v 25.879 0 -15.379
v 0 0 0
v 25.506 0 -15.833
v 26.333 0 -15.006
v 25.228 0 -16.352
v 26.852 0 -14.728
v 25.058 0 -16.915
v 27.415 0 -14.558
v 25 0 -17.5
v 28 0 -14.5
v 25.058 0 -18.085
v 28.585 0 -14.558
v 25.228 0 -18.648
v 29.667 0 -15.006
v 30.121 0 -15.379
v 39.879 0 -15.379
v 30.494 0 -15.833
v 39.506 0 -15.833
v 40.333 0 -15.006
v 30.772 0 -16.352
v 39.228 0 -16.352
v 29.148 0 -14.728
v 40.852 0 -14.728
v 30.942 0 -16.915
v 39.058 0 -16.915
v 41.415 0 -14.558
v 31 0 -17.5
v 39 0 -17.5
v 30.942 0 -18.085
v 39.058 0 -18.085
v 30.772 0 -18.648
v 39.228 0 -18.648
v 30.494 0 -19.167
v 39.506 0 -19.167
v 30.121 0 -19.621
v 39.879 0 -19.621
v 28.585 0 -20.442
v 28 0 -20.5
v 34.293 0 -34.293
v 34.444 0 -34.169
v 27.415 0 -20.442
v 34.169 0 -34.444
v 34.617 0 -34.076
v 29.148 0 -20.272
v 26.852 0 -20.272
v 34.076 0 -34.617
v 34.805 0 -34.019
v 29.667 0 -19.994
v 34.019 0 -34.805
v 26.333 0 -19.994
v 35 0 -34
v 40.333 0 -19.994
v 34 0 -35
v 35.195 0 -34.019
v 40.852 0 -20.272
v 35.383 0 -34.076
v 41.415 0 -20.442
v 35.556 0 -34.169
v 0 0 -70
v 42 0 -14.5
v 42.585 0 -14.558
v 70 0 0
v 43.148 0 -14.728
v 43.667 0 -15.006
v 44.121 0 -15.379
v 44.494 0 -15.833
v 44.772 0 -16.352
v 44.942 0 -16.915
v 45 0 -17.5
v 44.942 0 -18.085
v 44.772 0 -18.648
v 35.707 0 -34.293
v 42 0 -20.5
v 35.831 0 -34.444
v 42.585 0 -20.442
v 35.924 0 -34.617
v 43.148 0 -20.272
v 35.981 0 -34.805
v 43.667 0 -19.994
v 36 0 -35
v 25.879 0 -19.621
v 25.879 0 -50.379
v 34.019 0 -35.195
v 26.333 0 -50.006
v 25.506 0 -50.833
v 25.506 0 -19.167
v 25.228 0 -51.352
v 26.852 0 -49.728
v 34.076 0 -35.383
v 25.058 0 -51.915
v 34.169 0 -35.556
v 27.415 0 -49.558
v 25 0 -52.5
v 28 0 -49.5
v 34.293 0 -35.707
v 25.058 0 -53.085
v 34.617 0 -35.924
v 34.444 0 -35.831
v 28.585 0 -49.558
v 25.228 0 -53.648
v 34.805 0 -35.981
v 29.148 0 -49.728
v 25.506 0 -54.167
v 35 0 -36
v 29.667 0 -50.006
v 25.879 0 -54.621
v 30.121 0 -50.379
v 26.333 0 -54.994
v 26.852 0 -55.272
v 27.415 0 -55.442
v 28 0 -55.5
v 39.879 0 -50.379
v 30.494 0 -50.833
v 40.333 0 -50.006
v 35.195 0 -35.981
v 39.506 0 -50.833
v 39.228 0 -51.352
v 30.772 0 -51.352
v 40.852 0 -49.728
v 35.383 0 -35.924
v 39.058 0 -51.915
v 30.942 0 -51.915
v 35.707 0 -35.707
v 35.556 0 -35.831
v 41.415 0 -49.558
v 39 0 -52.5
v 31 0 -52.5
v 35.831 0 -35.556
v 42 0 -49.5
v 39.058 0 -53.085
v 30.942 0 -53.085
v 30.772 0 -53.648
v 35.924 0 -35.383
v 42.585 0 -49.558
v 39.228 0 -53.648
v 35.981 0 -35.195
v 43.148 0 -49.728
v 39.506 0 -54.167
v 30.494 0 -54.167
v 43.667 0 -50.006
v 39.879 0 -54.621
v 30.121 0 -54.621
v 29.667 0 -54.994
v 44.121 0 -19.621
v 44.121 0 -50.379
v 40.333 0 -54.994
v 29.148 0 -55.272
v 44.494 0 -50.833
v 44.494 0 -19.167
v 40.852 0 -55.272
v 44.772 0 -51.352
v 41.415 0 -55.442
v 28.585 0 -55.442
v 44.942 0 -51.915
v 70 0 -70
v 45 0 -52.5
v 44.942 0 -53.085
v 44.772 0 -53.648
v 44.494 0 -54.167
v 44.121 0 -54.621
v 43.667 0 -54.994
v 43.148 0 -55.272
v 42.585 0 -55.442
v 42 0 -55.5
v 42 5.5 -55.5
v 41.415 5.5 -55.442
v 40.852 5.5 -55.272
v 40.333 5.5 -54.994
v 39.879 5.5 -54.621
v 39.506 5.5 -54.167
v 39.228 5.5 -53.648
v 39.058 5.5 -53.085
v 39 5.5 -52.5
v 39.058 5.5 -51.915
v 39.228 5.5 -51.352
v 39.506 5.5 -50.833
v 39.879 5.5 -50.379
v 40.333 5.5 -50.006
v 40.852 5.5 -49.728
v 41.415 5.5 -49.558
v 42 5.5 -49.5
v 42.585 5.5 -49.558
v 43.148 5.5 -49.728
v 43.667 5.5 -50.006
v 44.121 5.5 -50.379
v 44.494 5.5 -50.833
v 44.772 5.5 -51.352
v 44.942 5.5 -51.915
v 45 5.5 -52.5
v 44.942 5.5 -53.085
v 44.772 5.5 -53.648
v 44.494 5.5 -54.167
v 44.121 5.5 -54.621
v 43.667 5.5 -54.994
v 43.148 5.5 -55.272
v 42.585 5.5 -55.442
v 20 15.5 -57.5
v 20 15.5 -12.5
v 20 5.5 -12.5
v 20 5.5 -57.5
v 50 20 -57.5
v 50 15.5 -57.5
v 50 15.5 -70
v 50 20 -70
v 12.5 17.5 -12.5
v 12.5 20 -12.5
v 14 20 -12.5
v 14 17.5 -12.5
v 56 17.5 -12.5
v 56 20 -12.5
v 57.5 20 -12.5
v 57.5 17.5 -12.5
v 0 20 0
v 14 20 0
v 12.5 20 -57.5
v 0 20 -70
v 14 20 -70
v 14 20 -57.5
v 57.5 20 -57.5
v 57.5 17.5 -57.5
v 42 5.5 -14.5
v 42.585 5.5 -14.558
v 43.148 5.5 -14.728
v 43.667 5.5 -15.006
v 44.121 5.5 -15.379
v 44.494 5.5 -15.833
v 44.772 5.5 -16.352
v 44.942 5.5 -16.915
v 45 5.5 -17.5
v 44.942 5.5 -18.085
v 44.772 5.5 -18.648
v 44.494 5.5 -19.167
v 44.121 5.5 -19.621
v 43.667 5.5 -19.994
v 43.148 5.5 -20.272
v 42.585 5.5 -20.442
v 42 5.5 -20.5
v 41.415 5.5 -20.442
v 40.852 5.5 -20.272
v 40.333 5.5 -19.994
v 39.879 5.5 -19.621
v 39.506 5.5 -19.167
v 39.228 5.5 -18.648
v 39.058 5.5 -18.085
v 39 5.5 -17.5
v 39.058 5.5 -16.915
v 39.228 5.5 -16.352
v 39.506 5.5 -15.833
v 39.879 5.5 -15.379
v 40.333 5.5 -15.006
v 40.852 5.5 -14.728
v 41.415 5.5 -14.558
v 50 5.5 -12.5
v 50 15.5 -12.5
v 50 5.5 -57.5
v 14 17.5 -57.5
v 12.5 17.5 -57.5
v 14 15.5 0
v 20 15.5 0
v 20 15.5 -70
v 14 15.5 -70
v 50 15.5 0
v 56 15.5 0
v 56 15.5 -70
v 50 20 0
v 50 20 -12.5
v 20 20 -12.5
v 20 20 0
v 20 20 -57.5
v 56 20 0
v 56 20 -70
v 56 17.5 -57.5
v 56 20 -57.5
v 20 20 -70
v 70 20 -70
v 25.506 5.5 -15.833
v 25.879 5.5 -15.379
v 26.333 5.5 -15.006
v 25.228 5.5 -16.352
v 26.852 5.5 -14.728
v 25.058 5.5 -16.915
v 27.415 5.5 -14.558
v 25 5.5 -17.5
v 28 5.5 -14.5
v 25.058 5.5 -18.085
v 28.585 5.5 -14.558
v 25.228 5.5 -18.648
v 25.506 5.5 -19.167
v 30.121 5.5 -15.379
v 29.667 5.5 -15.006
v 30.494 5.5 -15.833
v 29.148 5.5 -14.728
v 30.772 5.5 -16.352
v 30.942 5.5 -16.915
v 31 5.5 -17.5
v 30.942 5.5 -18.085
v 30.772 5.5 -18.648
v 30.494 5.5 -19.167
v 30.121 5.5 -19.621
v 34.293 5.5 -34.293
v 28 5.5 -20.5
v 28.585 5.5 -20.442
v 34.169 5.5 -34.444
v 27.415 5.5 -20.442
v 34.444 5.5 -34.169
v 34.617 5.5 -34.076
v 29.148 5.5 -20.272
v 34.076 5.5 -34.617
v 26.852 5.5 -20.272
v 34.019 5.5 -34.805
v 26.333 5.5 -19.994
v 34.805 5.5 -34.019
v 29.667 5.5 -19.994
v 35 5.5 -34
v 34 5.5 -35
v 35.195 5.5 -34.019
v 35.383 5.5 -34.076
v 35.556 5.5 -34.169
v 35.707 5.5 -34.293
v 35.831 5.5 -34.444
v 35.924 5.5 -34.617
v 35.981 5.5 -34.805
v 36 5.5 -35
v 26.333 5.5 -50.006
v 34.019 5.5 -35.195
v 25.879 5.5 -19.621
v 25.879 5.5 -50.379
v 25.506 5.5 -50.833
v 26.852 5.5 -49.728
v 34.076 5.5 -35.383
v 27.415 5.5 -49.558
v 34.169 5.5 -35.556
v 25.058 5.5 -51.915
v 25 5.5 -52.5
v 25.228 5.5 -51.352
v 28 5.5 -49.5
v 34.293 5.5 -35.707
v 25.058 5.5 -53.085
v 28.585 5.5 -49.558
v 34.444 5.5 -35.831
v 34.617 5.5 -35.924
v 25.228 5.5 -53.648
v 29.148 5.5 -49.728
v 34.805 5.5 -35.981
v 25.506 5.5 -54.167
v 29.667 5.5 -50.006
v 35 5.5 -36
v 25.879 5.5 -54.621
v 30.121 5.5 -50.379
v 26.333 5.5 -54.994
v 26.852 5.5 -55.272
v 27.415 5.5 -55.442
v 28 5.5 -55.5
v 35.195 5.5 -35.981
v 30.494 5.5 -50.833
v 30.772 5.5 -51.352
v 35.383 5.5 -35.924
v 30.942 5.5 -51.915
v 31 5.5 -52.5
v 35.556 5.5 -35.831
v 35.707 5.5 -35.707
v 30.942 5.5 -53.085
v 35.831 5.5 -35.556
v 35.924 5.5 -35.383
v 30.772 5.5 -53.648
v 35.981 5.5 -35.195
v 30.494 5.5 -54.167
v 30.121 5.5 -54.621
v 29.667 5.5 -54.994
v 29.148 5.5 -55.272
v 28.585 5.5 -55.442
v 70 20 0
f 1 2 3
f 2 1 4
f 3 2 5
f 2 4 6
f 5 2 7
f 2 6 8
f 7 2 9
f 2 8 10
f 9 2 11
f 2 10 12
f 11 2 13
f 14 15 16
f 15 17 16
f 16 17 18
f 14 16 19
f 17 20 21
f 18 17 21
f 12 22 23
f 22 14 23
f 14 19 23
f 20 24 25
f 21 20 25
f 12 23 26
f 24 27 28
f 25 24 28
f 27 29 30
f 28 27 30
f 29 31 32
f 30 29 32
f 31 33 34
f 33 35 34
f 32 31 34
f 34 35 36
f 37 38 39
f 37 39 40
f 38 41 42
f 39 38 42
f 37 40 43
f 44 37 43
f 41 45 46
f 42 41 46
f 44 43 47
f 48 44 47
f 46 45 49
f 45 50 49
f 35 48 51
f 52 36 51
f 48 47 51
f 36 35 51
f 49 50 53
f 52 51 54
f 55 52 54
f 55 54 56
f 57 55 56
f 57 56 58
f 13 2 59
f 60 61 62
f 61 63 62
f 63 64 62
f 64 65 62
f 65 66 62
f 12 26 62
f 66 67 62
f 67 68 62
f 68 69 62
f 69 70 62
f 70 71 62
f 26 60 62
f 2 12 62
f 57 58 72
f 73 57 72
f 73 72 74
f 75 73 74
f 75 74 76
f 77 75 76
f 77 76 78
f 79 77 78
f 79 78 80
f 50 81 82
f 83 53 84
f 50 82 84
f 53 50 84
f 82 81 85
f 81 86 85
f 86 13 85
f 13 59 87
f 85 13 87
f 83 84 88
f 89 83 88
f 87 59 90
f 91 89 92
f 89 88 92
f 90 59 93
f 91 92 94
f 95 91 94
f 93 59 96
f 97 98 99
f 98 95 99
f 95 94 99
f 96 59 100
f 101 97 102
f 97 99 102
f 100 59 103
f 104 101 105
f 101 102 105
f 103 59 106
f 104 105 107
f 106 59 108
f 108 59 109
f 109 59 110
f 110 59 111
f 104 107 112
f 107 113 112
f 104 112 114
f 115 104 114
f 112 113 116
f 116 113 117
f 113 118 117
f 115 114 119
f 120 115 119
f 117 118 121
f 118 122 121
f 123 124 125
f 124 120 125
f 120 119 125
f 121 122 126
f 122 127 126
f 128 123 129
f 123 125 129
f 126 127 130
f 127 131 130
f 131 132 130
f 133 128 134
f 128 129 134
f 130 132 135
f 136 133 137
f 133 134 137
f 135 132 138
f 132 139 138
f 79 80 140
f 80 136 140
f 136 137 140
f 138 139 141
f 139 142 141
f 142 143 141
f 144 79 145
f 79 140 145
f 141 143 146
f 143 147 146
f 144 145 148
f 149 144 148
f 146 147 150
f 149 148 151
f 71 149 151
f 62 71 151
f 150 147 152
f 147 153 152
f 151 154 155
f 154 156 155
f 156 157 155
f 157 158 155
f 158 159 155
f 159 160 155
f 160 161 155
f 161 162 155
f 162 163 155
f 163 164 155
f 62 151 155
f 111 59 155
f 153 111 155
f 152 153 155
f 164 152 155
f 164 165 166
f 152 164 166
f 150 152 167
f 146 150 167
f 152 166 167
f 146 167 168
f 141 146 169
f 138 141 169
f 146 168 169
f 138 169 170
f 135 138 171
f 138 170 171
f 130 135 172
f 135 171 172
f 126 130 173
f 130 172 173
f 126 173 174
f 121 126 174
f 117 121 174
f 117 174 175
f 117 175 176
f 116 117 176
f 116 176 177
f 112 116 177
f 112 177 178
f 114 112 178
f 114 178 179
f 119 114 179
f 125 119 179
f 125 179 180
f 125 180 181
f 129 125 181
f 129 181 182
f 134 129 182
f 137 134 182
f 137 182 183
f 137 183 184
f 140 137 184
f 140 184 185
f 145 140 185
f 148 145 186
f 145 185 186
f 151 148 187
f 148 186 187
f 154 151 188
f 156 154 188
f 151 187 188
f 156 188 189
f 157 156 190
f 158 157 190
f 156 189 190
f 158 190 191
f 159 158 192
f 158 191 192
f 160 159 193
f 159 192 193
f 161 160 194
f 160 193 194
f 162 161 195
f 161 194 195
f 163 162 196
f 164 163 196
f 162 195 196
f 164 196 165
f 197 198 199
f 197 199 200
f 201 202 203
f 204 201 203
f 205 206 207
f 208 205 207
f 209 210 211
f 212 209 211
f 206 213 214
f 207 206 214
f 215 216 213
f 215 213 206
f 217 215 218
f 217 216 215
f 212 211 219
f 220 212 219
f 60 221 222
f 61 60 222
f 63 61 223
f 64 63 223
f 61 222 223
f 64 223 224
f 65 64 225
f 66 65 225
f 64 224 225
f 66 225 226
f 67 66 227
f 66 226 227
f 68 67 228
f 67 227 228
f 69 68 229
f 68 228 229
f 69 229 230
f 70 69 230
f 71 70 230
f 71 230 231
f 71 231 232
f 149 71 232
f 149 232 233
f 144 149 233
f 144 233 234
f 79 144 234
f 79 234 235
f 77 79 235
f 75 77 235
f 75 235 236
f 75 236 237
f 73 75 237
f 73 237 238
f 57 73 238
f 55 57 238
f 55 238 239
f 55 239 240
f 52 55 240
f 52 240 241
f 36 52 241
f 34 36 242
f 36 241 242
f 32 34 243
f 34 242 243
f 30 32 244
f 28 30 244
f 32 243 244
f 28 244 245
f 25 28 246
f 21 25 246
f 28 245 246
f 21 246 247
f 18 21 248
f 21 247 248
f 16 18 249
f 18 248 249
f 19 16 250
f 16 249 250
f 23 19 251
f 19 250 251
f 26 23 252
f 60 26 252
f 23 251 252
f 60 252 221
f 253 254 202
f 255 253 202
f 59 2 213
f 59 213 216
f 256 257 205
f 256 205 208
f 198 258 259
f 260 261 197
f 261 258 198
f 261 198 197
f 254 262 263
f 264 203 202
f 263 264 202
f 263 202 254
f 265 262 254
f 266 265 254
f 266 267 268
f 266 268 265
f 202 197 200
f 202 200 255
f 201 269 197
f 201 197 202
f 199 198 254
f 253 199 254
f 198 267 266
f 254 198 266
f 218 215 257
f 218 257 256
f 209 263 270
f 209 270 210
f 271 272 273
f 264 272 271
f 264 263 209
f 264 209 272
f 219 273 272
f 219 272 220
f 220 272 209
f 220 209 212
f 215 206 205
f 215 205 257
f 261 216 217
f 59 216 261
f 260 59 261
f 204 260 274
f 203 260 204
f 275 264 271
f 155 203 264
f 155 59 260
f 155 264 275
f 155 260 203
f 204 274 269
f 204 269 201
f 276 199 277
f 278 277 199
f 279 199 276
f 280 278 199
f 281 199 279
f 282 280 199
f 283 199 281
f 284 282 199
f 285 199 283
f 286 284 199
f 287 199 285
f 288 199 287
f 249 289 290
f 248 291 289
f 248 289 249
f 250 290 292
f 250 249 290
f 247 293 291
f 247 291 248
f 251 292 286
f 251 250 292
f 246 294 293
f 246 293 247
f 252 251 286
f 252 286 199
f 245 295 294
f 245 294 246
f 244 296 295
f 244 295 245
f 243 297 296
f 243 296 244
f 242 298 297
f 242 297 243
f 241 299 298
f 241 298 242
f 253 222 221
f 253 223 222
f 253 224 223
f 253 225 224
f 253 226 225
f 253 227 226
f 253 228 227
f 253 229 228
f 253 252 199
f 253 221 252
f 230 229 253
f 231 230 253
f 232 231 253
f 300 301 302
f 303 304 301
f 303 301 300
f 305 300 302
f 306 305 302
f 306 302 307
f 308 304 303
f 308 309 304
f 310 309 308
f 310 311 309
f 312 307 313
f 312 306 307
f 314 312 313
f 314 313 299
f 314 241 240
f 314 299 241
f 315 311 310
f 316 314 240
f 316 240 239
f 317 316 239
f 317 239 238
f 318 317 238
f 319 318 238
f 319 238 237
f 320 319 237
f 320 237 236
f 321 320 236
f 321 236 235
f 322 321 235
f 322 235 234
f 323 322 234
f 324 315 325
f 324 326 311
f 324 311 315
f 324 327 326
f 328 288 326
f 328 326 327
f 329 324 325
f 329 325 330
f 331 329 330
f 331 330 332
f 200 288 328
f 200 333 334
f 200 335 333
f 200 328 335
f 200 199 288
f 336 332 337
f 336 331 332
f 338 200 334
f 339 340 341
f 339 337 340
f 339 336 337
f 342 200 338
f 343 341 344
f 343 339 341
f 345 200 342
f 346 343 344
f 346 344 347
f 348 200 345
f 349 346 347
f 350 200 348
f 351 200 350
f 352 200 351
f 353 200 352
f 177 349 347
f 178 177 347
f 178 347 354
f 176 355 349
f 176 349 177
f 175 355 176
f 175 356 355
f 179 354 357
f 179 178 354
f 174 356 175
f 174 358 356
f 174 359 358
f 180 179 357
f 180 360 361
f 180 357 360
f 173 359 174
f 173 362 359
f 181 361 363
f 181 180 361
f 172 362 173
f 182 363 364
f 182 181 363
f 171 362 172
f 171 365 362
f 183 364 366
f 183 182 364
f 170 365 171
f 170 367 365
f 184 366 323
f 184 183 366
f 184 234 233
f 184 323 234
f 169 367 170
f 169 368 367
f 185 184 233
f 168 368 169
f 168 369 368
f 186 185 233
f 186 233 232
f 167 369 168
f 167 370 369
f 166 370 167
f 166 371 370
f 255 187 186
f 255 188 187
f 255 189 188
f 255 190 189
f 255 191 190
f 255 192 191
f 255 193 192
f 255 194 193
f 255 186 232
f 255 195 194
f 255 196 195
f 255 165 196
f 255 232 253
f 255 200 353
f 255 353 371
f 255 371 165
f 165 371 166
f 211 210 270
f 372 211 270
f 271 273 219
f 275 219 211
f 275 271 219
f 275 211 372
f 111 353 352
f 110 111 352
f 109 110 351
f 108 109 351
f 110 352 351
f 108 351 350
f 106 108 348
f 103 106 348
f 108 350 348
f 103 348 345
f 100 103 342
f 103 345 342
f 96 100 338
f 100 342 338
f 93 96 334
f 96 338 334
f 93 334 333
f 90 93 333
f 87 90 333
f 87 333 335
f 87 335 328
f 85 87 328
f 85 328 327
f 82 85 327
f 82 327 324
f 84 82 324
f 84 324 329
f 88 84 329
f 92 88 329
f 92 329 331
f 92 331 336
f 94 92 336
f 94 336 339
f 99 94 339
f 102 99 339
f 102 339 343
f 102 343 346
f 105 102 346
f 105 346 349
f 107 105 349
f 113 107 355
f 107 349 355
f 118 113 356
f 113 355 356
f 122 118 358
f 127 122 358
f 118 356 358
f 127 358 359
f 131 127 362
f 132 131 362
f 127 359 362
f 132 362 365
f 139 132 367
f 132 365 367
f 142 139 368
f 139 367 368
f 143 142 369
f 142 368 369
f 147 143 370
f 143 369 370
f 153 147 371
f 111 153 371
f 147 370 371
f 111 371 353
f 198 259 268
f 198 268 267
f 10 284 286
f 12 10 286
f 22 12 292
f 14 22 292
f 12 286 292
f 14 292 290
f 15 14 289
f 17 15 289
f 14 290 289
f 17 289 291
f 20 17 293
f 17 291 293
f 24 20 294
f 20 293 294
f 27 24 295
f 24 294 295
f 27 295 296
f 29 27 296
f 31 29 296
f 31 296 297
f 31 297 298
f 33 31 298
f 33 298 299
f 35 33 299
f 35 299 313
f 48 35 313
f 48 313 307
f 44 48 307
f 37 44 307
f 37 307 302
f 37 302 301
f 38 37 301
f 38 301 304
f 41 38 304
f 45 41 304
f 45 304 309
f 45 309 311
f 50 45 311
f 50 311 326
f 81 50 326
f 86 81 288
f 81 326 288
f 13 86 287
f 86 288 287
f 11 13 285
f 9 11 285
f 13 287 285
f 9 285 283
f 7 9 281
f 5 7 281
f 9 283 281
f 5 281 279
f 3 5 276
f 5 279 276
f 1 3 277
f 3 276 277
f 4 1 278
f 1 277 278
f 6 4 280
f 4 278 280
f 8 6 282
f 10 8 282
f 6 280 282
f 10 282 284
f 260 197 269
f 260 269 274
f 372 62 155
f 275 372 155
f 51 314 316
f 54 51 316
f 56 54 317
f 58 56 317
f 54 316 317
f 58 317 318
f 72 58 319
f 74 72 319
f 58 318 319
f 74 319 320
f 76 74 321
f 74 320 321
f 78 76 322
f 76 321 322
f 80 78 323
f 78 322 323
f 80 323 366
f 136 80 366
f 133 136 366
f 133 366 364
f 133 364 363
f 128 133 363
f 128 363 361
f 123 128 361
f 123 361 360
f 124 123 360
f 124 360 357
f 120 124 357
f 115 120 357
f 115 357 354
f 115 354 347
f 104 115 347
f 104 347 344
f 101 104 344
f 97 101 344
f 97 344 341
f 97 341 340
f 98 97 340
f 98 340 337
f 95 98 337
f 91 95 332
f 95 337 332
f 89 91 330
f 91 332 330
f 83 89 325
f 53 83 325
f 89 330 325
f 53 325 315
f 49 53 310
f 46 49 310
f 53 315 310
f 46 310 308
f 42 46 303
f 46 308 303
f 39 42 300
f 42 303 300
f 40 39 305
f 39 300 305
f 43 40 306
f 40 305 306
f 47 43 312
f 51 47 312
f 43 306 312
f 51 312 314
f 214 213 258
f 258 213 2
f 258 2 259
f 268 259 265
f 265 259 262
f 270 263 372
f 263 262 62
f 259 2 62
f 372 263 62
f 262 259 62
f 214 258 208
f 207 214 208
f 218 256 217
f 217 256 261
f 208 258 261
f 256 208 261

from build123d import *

# Parameters (mm, degrees)
CROQUIS1_W                 = 70
CROQUIS1_H                 = 70
SALIENTE_EXTRUIR1_DEPTH    = 20
CROQUIS2_W                 = 45
CROQUIS2_H                 = 45
CORTAR_EXTRUIR1_DEPTH      = 2.5
CORTAR_EXTRUIR2_DEPTH      = 12.5
CORTAR_EXTRUIR2_DEPTH_BACK = 2
CROQUIS3_W                 = 6
CROQUIS3_H                 = 70
CROQUIS4_W                 = 30
CROQUIS4_H                 = 45
CORTAR_EXTRUIR3_DEPTH      = 12
CROQUIS5_R                 = 3
CROQUIS5_R_2               = 1
CORTAR_EXTRUIR4_DEPTH      = 11


with BuildPart() as part:
    # Croquis1 → Saliente-Extruir1 (new body)
    with BuildSketch(Plane(origin=(0, 0, 0), x_dir=(1, 0, 0), z_dir=(0, 1, 0))):
        with Locations((35, 35)):
            Rectangle(CROQUIS1_W, CROQUIS1_H)
    extrude(amount=SALIENTE_EXTRUIR1_DEPTH)

    # Croquis2 → Cortar-Extruir1 (cut)
    with BuildSketch(Plane(origin=(0, 20, 0), x_dir=(1, 0, 0), z_dir=(0, 1, 0))):
        with Locations((35, 35)):
            Rectangle(CROQUIS2_W, CROQUIS2_H)
    extrude(amount=-CORTAR_EXTRUIR1_DEPTH, mode=Mode.SUBTRACT)

    # Croquis3 → Cortar-Extruir2 (cut, two sides: drawn at the far end of the back side and taken through both)
    with BuildSketch(Plane(origin=(0, 17.5, 0), x_dir=(1, 0, 0), z_dir=(0, 1, 0)).offset(-CORTAR_EXTRUIR2_DEPTH_BACK)):
        with Locations((53, 35)):
            Rectangle(CROQUIS3_W, CROQUIS3_H)
        with Locations((17, 35)):
            Rectangle(CROQUIS3_W, CROQUIS3_H)
    extrude(amount=CORTAR_EXTRUIR2_DEPTH + CORTAR_EXTRUIR2_DEPTH_BACK, mode=Mode.SUBTRACT)

    # Croquis4 → Cortar-Extruir3 (cut)
    with BuildSketch(Plane(origin=(0, 17.5, 0), x_dir=(1, 0, 0), z_dir=(0, 1, 0))):
        with Locations((35, 35)):
            Rectangle(CROQUIS4_W, CROQUIS4_H)
    extrude(amount=-CORTAR_EXTRUIR3_DEPTH, mode=Mode.SUBTRACT)

    # Croquis5 → Cortar-Extruir4 (cut)
    with BuildSketch(Plane(origin=(0, 5.5, 0), x_dir=(1, 0, 0), z_dir=(0, 1, 0))):
        with Locations(Location((28, 17.5, 0), (0, 0, 270))):
            Circle(CROQUIS5_R)
        with Locations(Location((42, 17.5, 0), (0, 0, 270))):
            Circle(CROQUIS5_R)
        with Locations(Location((42, 52.5, 0), (0, 0, 90))):
            Circle(CROQUIS5_R)
        with Locations(Location((28, 52.5, 0), (0, 0, 90))):
            Circle(CROQUIS5_R)
        with Locations(Location((35, 35, 0), (0, 0, 270))):
            Circle(CROQUIS5_R_2)
    extrude(amount=-CORTAR_EXTRUIR4_DEPTH, mode=Mode.SUBTRACT)


solid = part.part
